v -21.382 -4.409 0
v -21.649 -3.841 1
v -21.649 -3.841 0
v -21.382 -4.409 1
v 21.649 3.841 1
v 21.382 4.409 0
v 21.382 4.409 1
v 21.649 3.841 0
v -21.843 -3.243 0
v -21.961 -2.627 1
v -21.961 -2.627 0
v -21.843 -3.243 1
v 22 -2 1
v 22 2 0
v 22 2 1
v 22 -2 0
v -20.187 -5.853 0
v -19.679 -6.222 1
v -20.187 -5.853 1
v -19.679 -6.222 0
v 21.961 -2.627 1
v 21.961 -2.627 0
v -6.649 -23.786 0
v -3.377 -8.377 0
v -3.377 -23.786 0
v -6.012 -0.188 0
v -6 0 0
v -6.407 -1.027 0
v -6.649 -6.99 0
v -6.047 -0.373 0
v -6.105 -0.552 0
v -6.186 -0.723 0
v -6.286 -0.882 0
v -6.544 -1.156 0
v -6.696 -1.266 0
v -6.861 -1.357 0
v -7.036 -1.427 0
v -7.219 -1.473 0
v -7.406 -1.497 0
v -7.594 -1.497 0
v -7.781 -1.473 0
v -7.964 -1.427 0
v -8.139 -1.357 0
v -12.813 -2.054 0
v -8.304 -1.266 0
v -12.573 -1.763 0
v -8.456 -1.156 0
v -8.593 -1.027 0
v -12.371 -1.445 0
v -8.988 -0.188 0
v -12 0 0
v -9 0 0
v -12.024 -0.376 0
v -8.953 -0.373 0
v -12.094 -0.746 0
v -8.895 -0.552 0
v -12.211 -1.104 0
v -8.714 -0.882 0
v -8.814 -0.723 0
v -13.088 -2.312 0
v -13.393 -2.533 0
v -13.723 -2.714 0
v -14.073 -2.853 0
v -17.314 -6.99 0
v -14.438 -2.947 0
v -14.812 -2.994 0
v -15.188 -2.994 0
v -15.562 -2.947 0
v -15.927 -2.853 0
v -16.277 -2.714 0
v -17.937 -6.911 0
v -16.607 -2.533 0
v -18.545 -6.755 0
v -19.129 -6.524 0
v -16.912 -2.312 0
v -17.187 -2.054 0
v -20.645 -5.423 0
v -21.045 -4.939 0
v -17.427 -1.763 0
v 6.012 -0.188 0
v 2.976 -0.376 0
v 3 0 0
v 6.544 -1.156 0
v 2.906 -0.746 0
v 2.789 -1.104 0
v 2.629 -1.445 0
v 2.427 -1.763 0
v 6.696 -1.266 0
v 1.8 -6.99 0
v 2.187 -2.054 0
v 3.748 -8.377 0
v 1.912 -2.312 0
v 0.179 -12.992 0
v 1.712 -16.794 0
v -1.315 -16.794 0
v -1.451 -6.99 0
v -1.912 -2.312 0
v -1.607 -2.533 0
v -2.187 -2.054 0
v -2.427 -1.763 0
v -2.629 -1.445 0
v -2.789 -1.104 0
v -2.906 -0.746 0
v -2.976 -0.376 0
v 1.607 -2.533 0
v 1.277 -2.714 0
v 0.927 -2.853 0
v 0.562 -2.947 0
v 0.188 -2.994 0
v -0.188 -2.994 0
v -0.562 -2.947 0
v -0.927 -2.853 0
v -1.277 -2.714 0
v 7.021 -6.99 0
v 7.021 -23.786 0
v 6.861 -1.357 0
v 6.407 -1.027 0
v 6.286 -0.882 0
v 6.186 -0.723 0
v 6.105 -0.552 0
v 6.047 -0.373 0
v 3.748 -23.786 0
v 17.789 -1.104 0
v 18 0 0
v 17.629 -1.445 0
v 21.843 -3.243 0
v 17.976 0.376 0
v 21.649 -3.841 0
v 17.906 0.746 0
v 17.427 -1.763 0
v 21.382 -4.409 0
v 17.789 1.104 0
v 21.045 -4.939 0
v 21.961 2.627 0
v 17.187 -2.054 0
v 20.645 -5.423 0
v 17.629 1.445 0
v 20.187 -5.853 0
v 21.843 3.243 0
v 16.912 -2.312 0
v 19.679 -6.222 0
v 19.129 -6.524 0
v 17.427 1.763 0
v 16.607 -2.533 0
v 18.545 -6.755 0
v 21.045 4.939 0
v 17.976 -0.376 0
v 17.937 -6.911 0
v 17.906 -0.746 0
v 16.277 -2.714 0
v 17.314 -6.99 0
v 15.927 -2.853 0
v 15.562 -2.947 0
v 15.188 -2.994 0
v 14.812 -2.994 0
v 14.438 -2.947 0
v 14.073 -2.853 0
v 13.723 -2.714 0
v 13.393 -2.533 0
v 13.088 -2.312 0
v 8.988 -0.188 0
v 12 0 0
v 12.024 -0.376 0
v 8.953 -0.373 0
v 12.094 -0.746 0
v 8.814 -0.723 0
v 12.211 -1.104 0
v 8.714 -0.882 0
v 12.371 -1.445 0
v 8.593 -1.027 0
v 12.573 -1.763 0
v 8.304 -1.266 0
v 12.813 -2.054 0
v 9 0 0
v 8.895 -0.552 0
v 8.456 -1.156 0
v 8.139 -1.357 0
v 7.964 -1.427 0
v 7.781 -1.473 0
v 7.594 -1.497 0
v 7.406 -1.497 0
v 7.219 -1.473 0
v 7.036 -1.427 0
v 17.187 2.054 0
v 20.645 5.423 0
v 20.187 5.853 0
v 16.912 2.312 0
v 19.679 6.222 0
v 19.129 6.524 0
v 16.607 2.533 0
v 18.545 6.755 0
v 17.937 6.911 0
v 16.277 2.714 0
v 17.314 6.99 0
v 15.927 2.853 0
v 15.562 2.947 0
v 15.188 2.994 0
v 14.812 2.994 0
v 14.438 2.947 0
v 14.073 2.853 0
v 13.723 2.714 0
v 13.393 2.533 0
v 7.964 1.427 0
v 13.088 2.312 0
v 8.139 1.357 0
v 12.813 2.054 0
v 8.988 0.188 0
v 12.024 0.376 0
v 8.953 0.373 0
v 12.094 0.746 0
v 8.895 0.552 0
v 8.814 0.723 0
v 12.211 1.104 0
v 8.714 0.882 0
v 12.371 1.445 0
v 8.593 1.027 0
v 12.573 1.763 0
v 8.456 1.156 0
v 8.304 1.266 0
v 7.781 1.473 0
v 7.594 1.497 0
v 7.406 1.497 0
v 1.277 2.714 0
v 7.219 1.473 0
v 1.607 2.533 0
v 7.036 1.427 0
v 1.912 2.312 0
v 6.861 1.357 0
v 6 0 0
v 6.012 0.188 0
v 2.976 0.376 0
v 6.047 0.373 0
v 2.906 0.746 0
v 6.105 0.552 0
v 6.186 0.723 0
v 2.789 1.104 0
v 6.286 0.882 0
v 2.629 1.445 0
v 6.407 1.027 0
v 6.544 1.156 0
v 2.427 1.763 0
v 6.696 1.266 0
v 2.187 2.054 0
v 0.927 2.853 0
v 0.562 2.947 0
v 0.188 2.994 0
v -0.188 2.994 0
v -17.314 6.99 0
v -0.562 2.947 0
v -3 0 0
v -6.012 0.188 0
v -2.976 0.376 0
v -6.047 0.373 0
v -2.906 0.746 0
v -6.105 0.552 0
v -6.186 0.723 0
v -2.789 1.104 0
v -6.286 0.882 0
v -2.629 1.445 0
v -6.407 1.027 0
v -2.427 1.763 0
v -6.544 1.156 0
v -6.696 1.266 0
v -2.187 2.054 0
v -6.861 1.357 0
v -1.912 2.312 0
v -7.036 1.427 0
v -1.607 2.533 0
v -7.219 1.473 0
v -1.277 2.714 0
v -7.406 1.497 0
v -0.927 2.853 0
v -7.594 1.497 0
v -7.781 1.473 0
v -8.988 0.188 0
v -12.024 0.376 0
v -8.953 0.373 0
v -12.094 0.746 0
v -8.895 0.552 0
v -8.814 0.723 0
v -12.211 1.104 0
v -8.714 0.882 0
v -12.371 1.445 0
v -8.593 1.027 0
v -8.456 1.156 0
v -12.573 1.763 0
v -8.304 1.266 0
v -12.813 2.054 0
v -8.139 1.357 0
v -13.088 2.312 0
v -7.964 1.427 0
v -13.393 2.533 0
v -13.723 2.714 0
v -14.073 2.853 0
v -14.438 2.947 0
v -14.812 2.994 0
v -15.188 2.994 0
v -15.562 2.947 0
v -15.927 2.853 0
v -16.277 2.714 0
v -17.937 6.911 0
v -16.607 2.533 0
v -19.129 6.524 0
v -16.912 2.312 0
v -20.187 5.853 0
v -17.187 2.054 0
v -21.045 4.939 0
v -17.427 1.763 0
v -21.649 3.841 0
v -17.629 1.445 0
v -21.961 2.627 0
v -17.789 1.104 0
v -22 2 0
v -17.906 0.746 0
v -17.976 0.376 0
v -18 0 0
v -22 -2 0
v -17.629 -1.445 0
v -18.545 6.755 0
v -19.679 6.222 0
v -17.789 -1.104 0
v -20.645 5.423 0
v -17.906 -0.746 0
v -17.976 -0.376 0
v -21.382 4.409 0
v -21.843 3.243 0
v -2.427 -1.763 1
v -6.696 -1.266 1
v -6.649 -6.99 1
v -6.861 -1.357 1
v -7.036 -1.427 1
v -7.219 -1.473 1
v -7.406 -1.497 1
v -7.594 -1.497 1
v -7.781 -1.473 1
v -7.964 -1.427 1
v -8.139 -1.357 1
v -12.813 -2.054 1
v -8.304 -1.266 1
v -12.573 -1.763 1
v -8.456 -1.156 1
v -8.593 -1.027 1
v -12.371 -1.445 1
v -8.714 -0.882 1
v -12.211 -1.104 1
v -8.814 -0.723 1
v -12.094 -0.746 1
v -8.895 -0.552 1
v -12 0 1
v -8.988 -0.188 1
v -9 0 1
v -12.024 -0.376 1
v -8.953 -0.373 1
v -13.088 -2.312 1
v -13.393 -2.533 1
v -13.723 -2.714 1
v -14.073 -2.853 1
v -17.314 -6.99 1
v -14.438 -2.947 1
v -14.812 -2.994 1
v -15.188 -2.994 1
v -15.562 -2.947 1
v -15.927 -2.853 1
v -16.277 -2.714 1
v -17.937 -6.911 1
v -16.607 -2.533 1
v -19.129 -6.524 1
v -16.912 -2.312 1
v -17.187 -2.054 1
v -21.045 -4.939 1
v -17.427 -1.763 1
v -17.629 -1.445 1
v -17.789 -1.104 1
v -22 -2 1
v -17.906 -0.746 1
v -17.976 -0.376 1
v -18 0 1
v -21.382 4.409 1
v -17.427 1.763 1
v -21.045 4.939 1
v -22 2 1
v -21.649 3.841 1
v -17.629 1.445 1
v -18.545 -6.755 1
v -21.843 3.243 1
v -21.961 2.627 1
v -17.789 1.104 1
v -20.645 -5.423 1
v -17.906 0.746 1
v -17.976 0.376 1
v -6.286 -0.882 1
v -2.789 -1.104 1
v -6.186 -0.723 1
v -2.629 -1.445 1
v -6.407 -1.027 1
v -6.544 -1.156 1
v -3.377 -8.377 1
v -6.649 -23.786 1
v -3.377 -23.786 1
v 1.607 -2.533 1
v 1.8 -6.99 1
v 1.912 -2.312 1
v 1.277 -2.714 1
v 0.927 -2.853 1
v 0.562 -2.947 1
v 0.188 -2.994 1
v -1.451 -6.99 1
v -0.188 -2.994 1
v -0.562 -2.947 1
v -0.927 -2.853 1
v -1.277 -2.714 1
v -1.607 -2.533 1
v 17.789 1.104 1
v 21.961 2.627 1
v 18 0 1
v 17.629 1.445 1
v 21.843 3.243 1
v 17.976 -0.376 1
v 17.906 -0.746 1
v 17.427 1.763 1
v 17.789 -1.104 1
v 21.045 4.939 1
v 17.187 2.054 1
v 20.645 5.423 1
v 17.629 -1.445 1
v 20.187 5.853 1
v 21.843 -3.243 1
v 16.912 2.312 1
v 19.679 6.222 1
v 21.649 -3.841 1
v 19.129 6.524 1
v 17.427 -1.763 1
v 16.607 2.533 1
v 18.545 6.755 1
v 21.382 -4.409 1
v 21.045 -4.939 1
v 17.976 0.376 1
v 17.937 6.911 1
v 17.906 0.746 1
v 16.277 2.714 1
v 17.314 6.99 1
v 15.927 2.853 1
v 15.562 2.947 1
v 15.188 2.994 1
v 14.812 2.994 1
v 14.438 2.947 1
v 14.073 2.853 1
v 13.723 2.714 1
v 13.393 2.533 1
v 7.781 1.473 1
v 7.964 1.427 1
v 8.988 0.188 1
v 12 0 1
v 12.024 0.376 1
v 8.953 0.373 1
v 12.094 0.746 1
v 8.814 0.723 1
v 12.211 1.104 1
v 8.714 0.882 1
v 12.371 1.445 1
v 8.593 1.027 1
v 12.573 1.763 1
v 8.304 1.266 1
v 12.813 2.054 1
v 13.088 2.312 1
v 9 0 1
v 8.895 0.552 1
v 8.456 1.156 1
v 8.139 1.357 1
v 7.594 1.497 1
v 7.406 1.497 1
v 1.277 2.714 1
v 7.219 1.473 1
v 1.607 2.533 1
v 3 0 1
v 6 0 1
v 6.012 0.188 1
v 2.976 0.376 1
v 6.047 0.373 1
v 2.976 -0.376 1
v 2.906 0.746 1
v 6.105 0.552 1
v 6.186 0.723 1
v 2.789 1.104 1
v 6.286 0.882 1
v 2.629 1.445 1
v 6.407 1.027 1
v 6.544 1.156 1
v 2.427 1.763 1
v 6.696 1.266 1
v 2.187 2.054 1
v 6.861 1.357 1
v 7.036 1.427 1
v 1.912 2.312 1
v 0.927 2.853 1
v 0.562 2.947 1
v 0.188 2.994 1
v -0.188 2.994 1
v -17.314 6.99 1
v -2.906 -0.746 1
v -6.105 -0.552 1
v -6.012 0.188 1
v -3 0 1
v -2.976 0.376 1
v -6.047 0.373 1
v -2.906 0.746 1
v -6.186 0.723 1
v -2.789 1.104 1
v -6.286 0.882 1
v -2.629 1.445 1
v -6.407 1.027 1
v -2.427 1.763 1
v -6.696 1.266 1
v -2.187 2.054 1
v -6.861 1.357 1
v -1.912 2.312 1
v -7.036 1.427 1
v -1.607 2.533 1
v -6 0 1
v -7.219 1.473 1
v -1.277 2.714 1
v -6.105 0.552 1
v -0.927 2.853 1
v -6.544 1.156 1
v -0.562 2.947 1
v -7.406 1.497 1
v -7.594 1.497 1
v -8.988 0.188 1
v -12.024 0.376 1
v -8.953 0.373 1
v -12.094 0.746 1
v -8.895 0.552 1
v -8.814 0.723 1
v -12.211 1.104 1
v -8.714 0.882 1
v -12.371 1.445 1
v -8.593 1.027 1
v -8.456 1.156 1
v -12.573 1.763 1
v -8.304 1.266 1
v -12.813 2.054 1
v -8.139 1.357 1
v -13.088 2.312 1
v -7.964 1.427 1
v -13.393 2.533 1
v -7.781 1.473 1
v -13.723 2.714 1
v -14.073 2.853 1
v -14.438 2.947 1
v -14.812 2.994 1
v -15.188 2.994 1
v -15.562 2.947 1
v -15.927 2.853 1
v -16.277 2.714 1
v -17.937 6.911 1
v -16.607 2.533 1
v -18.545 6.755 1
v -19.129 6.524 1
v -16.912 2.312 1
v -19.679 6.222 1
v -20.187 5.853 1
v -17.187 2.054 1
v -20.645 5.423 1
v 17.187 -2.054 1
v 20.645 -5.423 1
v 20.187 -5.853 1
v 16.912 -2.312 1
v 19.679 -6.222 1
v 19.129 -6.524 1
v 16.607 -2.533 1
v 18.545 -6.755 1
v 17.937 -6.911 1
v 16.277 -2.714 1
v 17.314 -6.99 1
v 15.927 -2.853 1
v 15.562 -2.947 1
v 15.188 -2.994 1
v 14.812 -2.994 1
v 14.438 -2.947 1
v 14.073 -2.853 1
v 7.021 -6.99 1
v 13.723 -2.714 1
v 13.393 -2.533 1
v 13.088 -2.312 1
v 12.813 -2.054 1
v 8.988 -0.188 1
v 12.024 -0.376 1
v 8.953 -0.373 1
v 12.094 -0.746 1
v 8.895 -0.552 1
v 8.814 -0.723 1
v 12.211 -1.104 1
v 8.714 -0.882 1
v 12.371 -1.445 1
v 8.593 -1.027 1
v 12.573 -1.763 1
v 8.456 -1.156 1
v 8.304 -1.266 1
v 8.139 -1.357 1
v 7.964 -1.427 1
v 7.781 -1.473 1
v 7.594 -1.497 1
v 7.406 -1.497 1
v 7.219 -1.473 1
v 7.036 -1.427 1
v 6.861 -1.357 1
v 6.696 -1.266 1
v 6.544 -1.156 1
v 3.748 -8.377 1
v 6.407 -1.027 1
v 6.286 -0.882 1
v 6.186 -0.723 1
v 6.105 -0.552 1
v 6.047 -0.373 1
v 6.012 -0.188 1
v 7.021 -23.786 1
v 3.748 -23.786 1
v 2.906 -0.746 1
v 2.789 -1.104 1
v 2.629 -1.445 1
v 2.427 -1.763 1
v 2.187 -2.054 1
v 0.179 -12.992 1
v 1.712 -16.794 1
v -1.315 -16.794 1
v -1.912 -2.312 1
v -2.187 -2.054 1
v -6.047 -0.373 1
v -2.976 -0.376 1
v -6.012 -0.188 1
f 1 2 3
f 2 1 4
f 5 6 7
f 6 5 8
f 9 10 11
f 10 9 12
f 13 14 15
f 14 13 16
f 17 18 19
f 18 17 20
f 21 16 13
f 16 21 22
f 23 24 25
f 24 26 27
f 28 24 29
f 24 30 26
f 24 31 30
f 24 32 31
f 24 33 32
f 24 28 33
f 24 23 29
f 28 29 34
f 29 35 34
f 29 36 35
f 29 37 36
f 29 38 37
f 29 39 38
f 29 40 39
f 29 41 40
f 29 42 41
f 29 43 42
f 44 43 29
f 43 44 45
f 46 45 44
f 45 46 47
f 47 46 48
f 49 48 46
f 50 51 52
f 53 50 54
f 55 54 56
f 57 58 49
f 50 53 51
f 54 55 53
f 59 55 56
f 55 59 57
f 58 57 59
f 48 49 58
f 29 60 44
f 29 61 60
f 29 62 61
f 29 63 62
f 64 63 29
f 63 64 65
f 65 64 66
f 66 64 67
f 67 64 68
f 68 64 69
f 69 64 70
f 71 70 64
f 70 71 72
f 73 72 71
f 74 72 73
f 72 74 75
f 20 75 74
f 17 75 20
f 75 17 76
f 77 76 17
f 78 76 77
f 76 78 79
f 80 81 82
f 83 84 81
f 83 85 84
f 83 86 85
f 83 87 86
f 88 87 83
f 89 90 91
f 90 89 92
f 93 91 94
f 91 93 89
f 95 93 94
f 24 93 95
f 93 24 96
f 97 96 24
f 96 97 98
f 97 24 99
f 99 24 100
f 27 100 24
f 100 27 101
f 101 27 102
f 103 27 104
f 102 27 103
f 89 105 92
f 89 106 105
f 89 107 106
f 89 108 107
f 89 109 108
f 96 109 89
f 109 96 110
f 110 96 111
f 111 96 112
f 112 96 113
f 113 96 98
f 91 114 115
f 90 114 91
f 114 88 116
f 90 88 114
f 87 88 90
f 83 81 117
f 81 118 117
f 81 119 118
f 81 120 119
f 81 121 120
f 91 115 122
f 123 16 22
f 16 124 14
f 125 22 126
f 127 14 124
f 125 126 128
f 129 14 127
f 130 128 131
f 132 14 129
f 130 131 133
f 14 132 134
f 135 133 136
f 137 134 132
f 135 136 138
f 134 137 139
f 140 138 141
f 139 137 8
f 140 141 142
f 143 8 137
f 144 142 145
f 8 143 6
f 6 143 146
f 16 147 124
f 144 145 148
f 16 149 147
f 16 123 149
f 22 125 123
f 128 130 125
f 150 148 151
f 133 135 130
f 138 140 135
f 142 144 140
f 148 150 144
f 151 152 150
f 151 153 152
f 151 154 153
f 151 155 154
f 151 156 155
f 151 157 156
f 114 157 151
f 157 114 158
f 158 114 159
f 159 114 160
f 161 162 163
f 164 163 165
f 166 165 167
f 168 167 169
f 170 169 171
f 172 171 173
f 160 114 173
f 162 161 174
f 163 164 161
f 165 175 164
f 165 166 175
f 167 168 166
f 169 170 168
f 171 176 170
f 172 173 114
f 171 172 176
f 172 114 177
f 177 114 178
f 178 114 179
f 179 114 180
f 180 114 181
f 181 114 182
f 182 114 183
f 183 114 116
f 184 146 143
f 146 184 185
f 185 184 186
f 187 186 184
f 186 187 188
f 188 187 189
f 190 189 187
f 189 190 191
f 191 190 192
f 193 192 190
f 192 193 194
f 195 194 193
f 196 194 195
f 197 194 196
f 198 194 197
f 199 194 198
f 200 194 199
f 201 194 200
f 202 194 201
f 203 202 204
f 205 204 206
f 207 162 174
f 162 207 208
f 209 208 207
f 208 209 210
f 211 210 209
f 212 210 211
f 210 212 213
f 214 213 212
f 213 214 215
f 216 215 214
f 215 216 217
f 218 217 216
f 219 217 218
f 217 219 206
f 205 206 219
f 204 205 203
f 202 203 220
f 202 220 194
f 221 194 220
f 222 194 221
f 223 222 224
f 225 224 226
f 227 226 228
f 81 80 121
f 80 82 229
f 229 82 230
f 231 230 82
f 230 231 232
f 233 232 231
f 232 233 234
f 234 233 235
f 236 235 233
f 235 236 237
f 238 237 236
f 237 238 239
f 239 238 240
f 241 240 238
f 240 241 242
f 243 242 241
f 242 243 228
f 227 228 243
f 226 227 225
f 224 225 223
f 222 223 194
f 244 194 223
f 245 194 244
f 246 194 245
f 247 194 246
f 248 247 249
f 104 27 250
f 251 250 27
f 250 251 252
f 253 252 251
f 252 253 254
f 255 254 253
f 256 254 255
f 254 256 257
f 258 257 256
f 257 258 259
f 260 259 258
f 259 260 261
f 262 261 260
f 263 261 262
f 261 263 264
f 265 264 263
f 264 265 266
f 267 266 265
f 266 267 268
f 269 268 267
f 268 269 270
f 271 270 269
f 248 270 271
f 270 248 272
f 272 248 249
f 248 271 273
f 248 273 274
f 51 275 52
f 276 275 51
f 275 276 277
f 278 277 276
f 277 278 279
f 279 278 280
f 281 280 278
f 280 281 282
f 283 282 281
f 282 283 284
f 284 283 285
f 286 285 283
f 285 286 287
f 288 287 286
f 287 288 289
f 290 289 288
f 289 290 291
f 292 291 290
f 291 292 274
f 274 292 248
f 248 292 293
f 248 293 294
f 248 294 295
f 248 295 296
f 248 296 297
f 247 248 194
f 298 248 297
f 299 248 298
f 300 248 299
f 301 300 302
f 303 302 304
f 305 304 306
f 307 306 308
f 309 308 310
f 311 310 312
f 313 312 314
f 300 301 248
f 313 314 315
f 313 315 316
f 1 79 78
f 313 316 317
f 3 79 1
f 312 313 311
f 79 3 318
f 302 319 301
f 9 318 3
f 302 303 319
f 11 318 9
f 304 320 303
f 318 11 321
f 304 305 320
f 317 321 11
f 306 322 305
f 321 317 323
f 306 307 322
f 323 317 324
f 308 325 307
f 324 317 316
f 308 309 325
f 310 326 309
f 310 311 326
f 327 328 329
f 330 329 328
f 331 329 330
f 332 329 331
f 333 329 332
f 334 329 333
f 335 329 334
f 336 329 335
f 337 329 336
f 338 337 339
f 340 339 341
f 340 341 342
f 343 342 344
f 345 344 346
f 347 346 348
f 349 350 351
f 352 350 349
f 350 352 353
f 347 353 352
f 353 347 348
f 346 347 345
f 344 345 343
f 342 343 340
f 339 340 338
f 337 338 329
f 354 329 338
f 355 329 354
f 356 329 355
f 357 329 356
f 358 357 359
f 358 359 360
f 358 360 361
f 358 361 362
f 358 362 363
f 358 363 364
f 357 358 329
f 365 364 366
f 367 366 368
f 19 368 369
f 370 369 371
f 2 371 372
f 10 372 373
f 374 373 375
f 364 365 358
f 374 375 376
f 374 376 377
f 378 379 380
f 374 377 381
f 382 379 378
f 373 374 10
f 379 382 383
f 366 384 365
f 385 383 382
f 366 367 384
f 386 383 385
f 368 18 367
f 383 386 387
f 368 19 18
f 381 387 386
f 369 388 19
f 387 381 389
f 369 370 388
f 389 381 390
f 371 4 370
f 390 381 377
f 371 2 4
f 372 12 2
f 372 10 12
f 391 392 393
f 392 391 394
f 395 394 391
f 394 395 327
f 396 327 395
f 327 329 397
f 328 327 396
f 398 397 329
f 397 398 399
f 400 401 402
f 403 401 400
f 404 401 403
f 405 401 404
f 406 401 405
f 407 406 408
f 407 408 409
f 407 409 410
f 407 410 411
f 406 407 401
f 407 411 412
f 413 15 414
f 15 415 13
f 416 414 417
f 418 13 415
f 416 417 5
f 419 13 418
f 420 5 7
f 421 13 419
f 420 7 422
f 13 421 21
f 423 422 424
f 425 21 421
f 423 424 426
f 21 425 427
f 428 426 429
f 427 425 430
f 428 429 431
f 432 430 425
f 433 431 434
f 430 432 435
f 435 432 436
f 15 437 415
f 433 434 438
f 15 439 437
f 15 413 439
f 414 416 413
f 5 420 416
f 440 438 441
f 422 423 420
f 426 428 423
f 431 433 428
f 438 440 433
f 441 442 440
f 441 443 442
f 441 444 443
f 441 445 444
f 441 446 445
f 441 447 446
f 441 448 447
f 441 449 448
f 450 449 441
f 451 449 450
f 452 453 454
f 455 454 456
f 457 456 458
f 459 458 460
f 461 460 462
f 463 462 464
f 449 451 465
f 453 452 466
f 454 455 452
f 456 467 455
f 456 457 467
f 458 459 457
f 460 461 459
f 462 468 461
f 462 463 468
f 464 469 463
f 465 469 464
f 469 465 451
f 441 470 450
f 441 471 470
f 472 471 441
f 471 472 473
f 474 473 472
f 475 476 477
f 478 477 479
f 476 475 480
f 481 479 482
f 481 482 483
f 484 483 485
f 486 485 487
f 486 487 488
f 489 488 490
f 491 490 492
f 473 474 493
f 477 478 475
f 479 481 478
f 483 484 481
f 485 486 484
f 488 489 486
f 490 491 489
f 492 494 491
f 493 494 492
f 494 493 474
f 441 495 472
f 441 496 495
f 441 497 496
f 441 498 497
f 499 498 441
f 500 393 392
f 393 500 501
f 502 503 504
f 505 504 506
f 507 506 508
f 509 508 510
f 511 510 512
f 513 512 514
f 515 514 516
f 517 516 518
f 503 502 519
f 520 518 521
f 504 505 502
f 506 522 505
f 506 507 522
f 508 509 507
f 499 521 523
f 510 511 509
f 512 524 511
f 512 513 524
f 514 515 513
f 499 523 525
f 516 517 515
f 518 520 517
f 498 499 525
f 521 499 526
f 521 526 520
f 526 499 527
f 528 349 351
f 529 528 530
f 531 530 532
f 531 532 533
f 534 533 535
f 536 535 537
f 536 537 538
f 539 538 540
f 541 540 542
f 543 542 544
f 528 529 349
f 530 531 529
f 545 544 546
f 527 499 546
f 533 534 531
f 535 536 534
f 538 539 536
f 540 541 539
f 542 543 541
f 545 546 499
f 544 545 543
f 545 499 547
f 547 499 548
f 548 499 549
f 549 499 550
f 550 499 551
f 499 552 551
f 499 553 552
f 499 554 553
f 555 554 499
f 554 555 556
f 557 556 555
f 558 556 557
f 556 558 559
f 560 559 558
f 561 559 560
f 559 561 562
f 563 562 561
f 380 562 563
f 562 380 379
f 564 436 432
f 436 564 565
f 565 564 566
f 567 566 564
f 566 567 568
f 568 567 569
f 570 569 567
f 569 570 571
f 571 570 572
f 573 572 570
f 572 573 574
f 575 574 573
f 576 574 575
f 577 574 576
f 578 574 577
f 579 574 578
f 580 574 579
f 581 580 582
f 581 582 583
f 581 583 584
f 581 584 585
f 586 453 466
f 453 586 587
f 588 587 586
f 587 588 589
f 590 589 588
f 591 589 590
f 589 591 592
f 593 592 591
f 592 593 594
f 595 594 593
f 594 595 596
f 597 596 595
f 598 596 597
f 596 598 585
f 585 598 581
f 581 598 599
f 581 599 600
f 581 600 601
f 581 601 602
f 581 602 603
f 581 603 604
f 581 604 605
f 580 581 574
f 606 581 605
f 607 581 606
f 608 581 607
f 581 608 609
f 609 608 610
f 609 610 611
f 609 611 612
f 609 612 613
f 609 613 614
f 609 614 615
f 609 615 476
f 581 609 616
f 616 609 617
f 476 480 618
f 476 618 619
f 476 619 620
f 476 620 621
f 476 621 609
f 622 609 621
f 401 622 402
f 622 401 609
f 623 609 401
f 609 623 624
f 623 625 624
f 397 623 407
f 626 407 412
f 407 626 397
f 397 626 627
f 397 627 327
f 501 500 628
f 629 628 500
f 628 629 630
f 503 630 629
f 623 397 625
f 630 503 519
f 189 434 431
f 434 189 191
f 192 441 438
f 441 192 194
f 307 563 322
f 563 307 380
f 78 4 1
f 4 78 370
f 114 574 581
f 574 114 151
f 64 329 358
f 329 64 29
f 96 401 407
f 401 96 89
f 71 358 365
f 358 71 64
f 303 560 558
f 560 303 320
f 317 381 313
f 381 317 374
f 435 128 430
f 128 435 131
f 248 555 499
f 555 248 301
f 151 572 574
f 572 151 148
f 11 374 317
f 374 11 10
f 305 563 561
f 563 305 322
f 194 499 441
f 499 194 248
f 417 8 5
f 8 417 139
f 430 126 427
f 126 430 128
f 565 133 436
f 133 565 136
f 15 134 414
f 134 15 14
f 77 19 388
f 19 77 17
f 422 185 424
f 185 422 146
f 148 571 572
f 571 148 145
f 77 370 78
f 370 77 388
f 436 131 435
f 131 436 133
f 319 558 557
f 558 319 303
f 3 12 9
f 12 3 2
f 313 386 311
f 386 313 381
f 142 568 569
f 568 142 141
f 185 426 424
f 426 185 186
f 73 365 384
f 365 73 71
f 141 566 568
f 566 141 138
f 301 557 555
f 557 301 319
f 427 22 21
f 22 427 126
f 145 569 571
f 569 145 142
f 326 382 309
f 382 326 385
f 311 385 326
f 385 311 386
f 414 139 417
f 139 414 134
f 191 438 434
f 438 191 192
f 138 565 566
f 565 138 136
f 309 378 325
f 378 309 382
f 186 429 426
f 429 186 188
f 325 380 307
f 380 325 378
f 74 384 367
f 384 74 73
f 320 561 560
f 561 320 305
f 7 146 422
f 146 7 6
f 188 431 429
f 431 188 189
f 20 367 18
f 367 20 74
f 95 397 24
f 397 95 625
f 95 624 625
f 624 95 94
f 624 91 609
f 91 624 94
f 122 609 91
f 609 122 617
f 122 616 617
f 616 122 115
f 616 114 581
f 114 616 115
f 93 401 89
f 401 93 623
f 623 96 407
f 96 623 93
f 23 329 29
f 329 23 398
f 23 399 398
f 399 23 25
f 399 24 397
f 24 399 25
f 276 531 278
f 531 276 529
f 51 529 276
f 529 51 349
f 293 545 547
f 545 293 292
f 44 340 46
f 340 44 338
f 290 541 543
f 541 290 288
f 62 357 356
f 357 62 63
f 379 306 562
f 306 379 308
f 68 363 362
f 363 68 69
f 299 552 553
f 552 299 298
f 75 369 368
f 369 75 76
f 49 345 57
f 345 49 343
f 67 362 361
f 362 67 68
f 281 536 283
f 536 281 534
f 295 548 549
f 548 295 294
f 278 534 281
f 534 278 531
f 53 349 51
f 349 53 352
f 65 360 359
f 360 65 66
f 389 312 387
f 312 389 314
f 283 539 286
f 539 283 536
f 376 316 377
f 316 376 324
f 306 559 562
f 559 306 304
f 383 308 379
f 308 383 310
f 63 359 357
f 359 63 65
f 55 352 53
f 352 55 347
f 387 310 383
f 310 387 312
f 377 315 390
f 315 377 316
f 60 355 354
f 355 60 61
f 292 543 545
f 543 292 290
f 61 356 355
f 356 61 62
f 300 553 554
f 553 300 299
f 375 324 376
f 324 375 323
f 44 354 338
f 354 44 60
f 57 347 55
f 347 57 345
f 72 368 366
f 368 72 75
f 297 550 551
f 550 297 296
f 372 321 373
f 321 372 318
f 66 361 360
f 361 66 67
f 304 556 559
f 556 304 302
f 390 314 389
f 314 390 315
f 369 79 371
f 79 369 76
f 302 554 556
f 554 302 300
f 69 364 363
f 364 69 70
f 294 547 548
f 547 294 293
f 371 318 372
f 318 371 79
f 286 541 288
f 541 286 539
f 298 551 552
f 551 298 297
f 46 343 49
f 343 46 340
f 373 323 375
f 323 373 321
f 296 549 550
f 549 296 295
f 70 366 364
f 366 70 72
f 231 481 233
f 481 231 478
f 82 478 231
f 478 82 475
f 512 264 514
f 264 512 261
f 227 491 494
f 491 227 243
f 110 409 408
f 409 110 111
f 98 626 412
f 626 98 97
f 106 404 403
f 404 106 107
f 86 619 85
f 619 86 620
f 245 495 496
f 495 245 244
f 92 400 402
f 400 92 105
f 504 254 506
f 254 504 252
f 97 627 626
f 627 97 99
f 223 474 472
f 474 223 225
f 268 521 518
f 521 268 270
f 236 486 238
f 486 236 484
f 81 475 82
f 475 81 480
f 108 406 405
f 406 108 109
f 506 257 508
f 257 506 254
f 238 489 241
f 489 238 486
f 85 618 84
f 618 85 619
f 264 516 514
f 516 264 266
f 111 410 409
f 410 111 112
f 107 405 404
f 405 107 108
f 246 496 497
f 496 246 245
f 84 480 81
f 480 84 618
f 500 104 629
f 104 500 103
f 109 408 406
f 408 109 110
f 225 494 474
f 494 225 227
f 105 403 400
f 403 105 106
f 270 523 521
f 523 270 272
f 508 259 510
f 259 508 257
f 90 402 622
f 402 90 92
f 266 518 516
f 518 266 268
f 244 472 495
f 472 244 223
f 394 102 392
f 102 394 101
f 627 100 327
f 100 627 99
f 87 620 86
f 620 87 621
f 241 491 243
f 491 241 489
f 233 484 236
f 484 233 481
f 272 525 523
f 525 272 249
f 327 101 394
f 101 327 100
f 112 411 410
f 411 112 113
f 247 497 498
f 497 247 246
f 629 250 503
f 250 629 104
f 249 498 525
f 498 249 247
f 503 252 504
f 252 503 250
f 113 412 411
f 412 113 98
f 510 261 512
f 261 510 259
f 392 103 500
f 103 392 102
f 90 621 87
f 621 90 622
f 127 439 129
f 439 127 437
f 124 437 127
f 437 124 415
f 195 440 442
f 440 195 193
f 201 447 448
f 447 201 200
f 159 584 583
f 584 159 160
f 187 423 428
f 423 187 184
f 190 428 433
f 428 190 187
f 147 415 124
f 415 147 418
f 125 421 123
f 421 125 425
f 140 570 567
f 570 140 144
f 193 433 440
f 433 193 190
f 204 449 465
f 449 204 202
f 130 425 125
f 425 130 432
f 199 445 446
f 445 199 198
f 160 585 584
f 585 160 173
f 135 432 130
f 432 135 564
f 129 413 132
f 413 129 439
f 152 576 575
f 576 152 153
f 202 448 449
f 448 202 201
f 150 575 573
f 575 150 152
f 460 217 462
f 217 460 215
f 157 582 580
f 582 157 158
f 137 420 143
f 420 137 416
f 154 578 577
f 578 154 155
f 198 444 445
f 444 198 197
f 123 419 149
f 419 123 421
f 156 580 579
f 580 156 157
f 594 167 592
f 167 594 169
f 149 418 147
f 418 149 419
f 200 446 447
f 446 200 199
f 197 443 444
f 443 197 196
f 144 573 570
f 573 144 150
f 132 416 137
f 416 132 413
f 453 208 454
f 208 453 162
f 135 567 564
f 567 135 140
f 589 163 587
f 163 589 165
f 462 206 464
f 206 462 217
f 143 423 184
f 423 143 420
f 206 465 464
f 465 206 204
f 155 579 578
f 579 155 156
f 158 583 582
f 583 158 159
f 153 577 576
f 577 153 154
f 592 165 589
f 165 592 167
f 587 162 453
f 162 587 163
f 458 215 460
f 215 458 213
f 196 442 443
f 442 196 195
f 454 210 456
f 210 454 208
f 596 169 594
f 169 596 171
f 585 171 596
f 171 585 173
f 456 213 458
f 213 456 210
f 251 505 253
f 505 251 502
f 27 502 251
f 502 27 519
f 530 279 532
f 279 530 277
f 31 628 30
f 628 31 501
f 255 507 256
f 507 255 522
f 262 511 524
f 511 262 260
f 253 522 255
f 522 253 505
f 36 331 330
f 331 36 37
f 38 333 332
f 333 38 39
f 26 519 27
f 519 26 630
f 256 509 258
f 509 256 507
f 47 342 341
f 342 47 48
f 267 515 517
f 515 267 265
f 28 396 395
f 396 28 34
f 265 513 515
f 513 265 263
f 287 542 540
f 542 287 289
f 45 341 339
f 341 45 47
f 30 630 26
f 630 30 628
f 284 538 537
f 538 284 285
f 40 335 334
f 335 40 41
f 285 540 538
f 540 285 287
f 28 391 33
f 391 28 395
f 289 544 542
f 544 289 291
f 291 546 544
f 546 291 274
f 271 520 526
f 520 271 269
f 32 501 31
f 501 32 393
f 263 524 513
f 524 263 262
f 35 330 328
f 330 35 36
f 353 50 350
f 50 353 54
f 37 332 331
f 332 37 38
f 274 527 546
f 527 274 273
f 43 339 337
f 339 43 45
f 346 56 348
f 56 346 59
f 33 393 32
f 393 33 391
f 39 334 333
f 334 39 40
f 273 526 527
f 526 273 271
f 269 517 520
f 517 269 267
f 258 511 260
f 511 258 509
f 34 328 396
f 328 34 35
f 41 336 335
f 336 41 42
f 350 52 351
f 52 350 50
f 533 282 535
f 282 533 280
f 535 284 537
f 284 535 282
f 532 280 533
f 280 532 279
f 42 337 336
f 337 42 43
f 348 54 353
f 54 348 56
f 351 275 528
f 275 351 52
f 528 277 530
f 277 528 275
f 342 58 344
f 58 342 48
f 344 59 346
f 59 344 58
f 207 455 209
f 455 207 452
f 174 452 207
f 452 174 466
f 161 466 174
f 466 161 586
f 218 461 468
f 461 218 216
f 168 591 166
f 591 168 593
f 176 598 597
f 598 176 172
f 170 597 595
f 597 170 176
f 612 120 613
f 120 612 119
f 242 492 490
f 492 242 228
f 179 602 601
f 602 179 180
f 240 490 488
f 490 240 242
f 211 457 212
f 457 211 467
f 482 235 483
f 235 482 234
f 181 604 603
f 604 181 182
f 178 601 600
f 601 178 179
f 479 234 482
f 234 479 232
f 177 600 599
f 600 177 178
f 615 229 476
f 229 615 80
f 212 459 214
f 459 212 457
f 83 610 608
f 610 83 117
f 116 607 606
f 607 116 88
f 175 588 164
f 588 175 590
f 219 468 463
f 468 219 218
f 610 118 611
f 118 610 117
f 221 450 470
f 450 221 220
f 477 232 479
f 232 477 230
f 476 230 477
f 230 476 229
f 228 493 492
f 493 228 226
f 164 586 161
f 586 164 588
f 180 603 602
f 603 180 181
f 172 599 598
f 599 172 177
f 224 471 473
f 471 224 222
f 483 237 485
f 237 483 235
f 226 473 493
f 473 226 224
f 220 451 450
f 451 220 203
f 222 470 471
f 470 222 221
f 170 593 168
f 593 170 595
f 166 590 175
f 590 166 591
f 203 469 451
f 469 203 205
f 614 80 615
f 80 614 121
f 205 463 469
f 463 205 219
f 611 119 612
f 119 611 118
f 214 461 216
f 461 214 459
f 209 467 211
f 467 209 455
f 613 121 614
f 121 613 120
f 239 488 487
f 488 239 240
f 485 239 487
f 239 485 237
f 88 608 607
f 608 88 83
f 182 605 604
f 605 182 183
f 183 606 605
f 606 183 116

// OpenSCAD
$fn = 50;


difference() {
	union() {
		*color(alpha = 1.0000000000, c = "gray") {
			translate(v = [0, 14, 0]) {
				linear_extrude(height = 1) {
					text(font = "Arial:style=Bold", halign = "center", size = 4.5000000000, text = "COMMENT description oobb_plate_shape_p_type_1_depth_3_width_1_thickness_m_extra_oobb_size", valign = "center");
				}
			}
		}
		hull() {
			translate(v = [-17.0000000000, 2.0000000000, 0]) {
				cylinder(h = 1, r = 5);
			}
			translate(v = [17.0000000000, 2.0000000000, 0]) {
				cylinder(h = 1, r = 5);
			}
			translate(v = [-17.0000000000, -2.0000000000, 0]) {
				cylinder(h = 1, r = 5);
			}
			translate(v = [17.0000000000, -2.0000000000, 0]) {
				cylinder(h = 1, r = 5);
			}
		}
		translate(v = [0, -5, 0]) {
			linear_extrude(height = 1) {
				text(font = "DejaVu Sans Mono:style=Bold", halign = "center", size = 19.0000000000, text = "M", valign = "top");
			}
		}
	}
	union() {
		*color(alpha = 1.0000000000, c = "gray") {
			translate(v = [0, 14, 0]) {
				linear_extrude(height = 1) {
					text(font = "Arial:style=Bold", halign = "center", size = 4.5000000000, text = "COMMENT description oobb_holes_shape_n_type_3_width_1_thickness_m_extra_oobb_size_1_height_'all'_holes_true_both_holes", valign = "center");
				}
			}
		}
		translate(v = [-15.0000000000, 0.0000000000, 0]) {
			translate(v = [0, 0, -50]) {
				cylinder(h = 100, r = 3.0000000000);
			}
		}
		translate(v = [0, 0, -50]) {
			cylinder(h = 100, r = 3.0000000000);
		}
		translate(v = [15.0000000000, 0.0000000000, 0]) {
			translate(v = [0, 0, -50]) {
				cylinder(h = 100, r = 3.0000000000);
			}
		}
		translate(v = [-15.0000000000, 0.0000000000, 0]) {
			translate(v = [0, 0, -50]) {
				cylinder(h = 100, r = 1.5000000000);
			}
		}
		translate(v = [-7.5000000000, 0.0000000000, 0]) {
			translate(v = [0, 0, -50]) {
				cylinder(h = 100, r = 1.5000000000);
			}
		}
		translate(v = [0, 0, -50]) {
			cylinder(h = 100, r = 1.5000000000);
		}
		translate(v = [7.5000000000, 0.0000000000, 0]) {
			translate(v = [0, 0, -50]) {
				cylinder(h = 100, r = 1.5000000000);
			}
		}
		translate(v = [15.0000000000, 0.0000000000, 0]) {
			translate(v = [0, 0, -50]) {
				cylinder(h = 100, r = 1.5000000000);
			}
		}
	}
}
